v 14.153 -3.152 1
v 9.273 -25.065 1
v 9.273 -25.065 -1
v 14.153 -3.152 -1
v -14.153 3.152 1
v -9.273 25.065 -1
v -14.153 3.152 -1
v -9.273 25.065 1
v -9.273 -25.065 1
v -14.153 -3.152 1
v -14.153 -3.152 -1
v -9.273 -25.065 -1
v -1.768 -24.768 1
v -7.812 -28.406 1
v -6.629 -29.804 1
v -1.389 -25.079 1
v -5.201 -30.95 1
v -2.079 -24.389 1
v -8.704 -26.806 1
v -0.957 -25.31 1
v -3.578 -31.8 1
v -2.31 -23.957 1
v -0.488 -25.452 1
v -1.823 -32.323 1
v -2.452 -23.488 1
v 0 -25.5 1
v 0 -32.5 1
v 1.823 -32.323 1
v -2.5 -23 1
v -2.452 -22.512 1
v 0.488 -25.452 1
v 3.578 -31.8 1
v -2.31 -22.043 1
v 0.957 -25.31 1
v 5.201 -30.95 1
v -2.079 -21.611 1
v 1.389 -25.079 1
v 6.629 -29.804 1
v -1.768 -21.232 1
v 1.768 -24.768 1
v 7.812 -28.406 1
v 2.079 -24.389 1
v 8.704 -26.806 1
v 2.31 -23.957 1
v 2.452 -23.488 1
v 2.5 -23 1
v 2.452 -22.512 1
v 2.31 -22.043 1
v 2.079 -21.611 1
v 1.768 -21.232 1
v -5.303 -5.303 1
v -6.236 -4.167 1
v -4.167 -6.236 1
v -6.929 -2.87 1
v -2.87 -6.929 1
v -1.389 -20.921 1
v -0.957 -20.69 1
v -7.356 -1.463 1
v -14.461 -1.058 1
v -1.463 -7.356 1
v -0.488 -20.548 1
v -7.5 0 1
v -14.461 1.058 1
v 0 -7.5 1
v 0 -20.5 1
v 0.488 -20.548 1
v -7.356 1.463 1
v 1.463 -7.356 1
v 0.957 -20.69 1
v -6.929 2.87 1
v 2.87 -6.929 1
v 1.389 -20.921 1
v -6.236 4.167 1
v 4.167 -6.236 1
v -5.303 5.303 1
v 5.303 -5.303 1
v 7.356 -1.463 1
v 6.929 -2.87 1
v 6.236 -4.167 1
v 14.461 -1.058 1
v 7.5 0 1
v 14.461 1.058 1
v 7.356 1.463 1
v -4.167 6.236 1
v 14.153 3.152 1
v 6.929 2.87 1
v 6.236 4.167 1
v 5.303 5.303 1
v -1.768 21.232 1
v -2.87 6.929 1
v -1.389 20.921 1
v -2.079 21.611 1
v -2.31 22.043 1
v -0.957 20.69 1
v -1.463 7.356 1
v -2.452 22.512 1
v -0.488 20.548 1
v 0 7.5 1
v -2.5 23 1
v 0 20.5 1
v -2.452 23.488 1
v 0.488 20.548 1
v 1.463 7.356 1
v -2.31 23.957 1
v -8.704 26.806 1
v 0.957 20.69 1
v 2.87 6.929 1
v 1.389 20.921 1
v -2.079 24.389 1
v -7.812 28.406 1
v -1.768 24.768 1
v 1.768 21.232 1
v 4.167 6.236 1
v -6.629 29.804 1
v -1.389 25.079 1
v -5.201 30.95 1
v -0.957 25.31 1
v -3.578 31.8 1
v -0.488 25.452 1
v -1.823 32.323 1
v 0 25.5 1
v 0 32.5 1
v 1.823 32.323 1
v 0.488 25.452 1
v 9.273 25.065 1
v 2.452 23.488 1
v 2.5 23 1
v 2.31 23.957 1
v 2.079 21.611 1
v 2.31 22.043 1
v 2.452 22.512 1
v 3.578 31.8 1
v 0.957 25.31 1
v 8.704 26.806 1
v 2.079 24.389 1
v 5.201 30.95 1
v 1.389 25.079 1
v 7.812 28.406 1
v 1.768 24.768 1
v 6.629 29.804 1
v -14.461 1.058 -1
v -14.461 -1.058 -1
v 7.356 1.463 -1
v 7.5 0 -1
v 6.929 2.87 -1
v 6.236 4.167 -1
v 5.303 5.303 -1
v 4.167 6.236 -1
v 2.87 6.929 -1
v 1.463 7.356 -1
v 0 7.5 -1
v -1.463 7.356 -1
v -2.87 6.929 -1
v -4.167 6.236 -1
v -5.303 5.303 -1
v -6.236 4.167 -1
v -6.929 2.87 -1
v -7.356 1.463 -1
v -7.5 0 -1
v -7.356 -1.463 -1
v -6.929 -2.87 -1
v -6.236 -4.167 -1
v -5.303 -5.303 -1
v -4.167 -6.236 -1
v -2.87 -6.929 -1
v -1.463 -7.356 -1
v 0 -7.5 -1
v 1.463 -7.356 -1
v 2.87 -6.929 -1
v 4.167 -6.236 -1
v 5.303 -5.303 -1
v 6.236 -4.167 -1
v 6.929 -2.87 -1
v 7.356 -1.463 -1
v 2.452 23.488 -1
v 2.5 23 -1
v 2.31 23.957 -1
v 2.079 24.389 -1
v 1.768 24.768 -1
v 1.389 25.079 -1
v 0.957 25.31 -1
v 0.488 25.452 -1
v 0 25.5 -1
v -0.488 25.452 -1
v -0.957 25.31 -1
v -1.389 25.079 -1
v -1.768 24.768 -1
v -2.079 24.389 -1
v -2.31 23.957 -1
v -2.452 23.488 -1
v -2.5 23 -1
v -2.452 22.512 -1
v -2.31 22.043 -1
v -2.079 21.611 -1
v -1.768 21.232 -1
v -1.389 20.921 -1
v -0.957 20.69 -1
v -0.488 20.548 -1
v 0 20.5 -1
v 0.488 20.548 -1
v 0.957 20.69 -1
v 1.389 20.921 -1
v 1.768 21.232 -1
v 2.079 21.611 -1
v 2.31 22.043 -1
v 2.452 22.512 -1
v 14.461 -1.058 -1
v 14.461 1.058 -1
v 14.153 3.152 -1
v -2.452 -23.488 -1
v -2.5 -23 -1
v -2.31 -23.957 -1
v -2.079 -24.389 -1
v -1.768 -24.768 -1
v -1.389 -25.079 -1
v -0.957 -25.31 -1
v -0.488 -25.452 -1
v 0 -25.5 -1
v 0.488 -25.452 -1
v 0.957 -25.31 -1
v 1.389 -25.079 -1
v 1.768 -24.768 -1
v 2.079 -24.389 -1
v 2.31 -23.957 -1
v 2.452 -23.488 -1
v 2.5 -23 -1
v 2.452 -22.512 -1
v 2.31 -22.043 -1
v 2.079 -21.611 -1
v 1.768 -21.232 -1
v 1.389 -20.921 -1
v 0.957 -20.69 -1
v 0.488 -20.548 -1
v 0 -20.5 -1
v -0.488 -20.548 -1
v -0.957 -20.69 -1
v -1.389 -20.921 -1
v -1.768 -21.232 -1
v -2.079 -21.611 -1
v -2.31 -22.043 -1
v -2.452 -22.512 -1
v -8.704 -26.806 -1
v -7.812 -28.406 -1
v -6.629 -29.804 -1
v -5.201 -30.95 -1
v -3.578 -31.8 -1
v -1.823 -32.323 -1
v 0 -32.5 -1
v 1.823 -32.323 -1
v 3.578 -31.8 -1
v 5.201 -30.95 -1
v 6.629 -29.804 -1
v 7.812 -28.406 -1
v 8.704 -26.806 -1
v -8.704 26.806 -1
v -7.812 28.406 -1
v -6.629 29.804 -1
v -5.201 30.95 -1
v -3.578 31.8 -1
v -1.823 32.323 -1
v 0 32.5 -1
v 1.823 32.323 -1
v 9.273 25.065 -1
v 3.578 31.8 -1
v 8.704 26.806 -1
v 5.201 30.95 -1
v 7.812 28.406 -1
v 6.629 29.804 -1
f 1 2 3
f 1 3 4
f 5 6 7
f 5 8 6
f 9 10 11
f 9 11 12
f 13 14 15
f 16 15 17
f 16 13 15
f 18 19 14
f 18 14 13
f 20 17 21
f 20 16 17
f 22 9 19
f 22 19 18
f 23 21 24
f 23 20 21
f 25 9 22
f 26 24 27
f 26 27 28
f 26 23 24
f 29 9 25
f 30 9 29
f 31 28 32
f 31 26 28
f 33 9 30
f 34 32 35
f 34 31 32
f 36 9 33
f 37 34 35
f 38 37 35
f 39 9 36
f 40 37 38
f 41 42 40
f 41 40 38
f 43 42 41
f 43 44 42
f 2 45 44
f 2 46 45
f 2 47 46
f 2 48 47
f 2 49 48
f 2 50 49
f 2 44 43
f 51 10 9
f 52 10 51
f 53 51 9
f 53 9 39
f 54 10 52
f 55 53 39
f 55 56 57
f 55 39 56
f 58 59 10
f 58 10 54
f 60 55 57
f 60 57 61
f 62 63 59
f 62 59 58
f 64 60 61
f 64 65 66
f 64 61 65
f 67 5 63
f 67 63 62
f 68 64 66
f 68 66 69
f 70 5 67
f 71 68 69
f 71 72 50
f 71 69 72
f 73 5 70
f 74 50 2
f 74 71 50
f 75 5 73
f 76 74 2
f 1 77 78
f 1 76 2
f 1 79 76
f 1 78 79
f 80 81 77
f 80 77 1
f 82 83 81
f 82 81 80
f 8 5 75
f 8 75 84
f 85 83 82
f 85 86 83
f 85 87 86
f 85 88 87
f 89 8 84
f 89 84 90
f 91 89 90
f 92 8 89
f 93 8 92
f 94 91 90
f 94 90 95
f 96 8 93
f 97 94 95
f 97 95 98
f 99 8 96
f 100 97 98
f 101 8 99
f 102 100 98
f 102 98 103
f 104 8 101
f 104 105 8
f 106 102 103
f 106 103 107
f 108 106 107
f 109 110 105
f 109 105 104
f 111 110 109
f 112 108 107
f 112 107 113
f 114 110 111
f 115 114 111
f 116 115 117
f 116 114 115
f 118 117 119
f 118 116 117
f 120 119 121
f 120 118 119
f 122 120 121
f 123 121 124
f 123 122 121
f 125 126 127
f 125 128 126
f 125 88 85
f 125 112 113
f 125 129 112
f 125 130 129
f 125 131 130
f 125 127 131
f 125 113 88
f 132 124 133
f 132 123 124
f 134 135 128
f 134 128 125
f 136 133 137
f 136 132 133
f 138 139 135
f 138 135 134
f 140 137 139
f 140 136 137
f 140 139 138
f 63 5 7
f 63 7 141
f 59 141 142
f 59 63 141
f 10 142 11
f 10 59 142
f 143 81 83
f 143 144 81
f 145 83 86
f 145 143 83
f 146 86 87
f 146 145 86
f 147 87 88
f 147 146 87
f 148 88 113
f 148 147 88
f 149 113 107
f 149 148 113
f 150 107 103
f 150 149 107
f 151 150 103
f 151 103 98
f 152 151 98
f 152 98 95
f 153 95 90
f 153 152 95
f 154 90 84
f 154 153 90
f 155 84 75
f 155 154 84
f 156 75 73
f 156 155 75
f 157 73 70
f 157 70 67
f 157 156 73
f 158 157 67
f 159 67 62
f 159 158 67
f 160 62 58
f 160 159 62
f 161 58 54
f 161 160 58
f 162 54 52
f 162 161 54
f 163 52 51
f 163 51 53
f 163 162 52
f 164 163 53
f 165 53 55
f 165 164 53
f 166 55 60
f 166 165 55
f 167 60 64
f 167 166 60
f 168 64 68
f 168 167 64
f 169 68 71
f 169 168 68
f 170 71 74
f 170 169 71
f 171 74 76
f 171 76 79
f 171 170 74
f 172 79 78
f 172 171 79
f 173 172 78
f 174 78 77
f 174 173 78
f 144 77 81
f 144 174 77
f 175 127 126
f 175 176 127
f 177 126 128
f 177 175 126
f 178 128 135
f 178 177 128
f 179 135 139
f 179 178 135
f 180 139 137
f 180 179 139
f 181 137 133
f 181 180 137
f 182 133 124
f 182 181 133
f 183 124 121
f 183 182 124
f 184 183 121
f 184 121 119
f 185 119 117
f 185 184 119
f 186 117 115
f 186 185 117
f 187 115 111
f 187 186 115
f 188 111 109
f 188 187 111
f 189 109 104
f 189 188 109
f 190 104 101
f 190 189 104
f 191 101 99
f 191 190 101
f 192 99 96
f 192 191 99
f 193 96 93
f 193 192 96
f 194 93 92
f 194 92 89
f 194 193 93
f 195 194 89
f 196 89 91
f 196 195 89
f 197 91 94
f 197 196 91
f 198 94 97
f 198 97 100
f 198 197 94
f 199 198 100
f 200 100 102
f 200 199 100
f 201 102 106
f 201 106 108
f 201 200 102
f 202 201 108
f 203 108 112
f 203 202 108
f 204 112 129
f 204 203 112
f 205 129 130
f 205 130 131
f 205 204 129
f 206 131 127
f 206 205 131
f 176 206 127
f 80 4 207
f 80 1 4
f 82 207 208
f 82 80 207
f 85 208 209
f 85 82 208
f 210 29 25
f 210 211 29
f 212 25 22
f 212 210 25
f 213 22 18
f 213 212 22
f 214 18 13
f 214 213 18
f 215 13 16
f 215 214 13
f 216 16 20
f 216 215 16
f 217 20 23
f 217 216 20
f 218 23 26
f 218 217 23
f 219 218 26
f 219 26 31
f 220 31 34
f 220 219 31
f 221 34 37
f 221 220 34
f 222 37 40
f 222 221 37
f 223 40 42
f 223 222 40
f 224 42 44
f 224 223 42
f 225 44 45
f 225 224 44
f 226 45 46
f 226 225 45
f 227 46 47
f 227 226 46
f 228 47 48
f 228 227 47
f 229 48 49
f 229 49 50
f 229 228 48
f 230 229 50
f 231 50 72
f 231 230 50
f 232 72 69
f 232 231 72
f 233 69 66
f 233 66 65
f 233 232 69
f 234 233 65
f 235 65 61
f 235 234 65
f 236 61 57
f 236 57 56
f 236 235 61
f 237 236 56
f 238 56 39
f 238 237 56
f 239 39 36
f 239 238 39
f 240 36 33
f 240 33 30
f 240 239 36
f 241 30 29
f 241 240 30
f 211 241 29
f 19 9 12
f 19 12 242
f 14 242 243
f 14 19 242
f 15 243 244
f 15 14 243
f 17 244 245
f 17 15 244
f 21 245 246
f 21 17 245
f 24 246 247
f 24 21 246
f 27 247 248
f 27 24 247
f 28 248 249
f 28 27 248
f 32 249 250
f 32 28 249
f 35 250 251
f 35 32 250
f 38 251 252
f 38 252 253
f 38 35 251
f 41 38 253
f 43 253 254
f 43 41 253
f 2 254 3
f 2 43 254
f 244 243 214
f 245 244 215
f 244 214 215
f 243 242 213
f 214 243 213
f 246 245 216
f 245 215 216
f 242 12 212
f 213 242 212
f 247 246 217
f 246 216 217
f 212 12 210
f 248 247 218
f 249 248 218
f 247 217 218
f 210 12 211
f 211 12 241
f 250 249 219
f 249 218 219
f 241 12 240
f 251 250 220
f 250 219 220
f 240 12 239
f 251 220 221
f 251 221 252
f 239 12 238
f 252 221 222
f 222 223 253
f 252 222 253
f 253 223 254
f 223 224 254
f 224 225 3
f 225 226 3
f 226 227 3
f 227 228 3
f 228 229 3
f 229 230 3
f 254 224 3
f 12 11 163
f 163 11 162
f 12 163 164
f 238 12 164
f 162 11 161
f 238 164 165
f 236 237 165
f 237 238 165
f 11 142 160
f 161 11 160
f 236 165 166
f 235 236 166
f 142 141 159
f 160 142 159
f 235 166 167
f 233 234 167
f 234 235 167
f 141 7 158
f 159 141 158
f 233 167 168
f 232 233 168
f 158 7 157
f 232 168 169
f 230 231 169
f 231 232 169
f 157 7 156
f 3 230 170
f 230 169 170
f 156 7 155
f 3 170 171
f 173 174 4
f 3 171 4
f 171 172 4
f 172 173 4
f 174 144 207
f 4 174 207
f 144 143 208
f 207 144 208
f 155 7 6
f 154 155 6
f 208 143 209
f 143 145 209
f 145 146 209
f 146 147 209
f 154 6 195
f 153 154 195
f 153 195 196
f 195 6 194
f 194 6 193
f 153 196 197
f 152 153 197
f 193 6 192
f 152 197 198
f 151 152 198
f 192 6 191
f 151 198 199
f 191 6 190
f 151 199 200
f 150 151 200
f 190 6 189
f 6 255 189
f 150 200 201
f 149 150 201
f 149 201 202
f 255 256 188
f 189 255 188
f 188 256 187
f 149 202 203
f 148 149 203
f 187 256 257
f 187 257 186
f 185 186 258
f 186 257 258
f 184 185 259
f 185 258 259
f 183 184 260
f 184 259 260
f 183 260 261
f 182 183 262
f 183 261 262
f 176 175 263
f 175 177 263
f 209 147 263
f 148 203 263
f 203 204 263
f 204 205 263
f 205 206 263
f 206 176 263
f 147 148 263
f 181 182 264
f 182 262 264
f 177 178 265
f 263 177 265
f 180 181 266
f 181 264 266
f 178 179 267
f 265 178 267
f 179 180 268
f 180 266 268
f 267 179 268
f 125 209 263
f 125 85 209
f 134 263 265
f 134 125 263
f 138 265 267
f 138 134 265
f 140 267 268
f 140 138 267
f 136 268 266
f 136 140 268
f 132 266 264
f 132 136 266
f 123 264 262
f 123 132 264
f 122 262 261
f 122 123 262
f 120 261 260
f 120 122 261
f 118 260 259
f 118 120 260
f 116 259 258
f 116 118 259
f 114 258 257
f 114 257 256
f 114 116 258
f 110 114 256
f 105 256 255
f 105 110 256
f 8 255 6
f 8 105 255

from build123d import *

# Parameters (mm, degrees)
SKETCH1_R           = 7.5
SKETCH1_R_2         = 2.5
BOSS_EXTRUDE1_DEPTH = 1


with BuildPart() as part:
    # Sketch1 → Boss-Extrude1 (new, symmetric)
    with BuildSketch(Plane.XY):
        with BuildLine():
            Line((-9.272803089, 25.065217391), (-14.153225767, 3.152173913))
            ThreePointArc((-14.153225767, 3.152173913), (-14.5, 0), (-14.153225767, -3.152173913))
            Line((-14.153225767, -3.152173913), (-9.272803089, -25.065217391))
            ThreePointArc((-9.272803089, -25.065217391), (0, -32.5), (9.272803089, -25.065217391))
            Line((9.272803089, -25.065217391), (14.153225767, -3.152173913))
            ThreePointArc((14.153225767, -3.152173913), (14.5, 0), (14.153225767, 3.152173913))
            Line((14.153225767, 3.152173913), (9.272803089, 25.065217391))
            ThreePointArc((9.272803089, 25.065217391), (0, 32.5), (-9.272803089, 25.065217391))
        make_face()
        Circle(SKETCH1_R, mode=Mode.SUBTRACT)
        with Locations((0, 23)):
            Circle(SKETCH1_R_2, mode=Mode.SUBTRACT)
        with Locations(Location((0, -23, 0), (0, 0, 180))):
            Circle(SKETCH1_R_2, mode=Mode.SUBTRACT)
    extrude(amount=BOSS_EXTRUDE1_DEPTH, both=True)


solid = part.part
